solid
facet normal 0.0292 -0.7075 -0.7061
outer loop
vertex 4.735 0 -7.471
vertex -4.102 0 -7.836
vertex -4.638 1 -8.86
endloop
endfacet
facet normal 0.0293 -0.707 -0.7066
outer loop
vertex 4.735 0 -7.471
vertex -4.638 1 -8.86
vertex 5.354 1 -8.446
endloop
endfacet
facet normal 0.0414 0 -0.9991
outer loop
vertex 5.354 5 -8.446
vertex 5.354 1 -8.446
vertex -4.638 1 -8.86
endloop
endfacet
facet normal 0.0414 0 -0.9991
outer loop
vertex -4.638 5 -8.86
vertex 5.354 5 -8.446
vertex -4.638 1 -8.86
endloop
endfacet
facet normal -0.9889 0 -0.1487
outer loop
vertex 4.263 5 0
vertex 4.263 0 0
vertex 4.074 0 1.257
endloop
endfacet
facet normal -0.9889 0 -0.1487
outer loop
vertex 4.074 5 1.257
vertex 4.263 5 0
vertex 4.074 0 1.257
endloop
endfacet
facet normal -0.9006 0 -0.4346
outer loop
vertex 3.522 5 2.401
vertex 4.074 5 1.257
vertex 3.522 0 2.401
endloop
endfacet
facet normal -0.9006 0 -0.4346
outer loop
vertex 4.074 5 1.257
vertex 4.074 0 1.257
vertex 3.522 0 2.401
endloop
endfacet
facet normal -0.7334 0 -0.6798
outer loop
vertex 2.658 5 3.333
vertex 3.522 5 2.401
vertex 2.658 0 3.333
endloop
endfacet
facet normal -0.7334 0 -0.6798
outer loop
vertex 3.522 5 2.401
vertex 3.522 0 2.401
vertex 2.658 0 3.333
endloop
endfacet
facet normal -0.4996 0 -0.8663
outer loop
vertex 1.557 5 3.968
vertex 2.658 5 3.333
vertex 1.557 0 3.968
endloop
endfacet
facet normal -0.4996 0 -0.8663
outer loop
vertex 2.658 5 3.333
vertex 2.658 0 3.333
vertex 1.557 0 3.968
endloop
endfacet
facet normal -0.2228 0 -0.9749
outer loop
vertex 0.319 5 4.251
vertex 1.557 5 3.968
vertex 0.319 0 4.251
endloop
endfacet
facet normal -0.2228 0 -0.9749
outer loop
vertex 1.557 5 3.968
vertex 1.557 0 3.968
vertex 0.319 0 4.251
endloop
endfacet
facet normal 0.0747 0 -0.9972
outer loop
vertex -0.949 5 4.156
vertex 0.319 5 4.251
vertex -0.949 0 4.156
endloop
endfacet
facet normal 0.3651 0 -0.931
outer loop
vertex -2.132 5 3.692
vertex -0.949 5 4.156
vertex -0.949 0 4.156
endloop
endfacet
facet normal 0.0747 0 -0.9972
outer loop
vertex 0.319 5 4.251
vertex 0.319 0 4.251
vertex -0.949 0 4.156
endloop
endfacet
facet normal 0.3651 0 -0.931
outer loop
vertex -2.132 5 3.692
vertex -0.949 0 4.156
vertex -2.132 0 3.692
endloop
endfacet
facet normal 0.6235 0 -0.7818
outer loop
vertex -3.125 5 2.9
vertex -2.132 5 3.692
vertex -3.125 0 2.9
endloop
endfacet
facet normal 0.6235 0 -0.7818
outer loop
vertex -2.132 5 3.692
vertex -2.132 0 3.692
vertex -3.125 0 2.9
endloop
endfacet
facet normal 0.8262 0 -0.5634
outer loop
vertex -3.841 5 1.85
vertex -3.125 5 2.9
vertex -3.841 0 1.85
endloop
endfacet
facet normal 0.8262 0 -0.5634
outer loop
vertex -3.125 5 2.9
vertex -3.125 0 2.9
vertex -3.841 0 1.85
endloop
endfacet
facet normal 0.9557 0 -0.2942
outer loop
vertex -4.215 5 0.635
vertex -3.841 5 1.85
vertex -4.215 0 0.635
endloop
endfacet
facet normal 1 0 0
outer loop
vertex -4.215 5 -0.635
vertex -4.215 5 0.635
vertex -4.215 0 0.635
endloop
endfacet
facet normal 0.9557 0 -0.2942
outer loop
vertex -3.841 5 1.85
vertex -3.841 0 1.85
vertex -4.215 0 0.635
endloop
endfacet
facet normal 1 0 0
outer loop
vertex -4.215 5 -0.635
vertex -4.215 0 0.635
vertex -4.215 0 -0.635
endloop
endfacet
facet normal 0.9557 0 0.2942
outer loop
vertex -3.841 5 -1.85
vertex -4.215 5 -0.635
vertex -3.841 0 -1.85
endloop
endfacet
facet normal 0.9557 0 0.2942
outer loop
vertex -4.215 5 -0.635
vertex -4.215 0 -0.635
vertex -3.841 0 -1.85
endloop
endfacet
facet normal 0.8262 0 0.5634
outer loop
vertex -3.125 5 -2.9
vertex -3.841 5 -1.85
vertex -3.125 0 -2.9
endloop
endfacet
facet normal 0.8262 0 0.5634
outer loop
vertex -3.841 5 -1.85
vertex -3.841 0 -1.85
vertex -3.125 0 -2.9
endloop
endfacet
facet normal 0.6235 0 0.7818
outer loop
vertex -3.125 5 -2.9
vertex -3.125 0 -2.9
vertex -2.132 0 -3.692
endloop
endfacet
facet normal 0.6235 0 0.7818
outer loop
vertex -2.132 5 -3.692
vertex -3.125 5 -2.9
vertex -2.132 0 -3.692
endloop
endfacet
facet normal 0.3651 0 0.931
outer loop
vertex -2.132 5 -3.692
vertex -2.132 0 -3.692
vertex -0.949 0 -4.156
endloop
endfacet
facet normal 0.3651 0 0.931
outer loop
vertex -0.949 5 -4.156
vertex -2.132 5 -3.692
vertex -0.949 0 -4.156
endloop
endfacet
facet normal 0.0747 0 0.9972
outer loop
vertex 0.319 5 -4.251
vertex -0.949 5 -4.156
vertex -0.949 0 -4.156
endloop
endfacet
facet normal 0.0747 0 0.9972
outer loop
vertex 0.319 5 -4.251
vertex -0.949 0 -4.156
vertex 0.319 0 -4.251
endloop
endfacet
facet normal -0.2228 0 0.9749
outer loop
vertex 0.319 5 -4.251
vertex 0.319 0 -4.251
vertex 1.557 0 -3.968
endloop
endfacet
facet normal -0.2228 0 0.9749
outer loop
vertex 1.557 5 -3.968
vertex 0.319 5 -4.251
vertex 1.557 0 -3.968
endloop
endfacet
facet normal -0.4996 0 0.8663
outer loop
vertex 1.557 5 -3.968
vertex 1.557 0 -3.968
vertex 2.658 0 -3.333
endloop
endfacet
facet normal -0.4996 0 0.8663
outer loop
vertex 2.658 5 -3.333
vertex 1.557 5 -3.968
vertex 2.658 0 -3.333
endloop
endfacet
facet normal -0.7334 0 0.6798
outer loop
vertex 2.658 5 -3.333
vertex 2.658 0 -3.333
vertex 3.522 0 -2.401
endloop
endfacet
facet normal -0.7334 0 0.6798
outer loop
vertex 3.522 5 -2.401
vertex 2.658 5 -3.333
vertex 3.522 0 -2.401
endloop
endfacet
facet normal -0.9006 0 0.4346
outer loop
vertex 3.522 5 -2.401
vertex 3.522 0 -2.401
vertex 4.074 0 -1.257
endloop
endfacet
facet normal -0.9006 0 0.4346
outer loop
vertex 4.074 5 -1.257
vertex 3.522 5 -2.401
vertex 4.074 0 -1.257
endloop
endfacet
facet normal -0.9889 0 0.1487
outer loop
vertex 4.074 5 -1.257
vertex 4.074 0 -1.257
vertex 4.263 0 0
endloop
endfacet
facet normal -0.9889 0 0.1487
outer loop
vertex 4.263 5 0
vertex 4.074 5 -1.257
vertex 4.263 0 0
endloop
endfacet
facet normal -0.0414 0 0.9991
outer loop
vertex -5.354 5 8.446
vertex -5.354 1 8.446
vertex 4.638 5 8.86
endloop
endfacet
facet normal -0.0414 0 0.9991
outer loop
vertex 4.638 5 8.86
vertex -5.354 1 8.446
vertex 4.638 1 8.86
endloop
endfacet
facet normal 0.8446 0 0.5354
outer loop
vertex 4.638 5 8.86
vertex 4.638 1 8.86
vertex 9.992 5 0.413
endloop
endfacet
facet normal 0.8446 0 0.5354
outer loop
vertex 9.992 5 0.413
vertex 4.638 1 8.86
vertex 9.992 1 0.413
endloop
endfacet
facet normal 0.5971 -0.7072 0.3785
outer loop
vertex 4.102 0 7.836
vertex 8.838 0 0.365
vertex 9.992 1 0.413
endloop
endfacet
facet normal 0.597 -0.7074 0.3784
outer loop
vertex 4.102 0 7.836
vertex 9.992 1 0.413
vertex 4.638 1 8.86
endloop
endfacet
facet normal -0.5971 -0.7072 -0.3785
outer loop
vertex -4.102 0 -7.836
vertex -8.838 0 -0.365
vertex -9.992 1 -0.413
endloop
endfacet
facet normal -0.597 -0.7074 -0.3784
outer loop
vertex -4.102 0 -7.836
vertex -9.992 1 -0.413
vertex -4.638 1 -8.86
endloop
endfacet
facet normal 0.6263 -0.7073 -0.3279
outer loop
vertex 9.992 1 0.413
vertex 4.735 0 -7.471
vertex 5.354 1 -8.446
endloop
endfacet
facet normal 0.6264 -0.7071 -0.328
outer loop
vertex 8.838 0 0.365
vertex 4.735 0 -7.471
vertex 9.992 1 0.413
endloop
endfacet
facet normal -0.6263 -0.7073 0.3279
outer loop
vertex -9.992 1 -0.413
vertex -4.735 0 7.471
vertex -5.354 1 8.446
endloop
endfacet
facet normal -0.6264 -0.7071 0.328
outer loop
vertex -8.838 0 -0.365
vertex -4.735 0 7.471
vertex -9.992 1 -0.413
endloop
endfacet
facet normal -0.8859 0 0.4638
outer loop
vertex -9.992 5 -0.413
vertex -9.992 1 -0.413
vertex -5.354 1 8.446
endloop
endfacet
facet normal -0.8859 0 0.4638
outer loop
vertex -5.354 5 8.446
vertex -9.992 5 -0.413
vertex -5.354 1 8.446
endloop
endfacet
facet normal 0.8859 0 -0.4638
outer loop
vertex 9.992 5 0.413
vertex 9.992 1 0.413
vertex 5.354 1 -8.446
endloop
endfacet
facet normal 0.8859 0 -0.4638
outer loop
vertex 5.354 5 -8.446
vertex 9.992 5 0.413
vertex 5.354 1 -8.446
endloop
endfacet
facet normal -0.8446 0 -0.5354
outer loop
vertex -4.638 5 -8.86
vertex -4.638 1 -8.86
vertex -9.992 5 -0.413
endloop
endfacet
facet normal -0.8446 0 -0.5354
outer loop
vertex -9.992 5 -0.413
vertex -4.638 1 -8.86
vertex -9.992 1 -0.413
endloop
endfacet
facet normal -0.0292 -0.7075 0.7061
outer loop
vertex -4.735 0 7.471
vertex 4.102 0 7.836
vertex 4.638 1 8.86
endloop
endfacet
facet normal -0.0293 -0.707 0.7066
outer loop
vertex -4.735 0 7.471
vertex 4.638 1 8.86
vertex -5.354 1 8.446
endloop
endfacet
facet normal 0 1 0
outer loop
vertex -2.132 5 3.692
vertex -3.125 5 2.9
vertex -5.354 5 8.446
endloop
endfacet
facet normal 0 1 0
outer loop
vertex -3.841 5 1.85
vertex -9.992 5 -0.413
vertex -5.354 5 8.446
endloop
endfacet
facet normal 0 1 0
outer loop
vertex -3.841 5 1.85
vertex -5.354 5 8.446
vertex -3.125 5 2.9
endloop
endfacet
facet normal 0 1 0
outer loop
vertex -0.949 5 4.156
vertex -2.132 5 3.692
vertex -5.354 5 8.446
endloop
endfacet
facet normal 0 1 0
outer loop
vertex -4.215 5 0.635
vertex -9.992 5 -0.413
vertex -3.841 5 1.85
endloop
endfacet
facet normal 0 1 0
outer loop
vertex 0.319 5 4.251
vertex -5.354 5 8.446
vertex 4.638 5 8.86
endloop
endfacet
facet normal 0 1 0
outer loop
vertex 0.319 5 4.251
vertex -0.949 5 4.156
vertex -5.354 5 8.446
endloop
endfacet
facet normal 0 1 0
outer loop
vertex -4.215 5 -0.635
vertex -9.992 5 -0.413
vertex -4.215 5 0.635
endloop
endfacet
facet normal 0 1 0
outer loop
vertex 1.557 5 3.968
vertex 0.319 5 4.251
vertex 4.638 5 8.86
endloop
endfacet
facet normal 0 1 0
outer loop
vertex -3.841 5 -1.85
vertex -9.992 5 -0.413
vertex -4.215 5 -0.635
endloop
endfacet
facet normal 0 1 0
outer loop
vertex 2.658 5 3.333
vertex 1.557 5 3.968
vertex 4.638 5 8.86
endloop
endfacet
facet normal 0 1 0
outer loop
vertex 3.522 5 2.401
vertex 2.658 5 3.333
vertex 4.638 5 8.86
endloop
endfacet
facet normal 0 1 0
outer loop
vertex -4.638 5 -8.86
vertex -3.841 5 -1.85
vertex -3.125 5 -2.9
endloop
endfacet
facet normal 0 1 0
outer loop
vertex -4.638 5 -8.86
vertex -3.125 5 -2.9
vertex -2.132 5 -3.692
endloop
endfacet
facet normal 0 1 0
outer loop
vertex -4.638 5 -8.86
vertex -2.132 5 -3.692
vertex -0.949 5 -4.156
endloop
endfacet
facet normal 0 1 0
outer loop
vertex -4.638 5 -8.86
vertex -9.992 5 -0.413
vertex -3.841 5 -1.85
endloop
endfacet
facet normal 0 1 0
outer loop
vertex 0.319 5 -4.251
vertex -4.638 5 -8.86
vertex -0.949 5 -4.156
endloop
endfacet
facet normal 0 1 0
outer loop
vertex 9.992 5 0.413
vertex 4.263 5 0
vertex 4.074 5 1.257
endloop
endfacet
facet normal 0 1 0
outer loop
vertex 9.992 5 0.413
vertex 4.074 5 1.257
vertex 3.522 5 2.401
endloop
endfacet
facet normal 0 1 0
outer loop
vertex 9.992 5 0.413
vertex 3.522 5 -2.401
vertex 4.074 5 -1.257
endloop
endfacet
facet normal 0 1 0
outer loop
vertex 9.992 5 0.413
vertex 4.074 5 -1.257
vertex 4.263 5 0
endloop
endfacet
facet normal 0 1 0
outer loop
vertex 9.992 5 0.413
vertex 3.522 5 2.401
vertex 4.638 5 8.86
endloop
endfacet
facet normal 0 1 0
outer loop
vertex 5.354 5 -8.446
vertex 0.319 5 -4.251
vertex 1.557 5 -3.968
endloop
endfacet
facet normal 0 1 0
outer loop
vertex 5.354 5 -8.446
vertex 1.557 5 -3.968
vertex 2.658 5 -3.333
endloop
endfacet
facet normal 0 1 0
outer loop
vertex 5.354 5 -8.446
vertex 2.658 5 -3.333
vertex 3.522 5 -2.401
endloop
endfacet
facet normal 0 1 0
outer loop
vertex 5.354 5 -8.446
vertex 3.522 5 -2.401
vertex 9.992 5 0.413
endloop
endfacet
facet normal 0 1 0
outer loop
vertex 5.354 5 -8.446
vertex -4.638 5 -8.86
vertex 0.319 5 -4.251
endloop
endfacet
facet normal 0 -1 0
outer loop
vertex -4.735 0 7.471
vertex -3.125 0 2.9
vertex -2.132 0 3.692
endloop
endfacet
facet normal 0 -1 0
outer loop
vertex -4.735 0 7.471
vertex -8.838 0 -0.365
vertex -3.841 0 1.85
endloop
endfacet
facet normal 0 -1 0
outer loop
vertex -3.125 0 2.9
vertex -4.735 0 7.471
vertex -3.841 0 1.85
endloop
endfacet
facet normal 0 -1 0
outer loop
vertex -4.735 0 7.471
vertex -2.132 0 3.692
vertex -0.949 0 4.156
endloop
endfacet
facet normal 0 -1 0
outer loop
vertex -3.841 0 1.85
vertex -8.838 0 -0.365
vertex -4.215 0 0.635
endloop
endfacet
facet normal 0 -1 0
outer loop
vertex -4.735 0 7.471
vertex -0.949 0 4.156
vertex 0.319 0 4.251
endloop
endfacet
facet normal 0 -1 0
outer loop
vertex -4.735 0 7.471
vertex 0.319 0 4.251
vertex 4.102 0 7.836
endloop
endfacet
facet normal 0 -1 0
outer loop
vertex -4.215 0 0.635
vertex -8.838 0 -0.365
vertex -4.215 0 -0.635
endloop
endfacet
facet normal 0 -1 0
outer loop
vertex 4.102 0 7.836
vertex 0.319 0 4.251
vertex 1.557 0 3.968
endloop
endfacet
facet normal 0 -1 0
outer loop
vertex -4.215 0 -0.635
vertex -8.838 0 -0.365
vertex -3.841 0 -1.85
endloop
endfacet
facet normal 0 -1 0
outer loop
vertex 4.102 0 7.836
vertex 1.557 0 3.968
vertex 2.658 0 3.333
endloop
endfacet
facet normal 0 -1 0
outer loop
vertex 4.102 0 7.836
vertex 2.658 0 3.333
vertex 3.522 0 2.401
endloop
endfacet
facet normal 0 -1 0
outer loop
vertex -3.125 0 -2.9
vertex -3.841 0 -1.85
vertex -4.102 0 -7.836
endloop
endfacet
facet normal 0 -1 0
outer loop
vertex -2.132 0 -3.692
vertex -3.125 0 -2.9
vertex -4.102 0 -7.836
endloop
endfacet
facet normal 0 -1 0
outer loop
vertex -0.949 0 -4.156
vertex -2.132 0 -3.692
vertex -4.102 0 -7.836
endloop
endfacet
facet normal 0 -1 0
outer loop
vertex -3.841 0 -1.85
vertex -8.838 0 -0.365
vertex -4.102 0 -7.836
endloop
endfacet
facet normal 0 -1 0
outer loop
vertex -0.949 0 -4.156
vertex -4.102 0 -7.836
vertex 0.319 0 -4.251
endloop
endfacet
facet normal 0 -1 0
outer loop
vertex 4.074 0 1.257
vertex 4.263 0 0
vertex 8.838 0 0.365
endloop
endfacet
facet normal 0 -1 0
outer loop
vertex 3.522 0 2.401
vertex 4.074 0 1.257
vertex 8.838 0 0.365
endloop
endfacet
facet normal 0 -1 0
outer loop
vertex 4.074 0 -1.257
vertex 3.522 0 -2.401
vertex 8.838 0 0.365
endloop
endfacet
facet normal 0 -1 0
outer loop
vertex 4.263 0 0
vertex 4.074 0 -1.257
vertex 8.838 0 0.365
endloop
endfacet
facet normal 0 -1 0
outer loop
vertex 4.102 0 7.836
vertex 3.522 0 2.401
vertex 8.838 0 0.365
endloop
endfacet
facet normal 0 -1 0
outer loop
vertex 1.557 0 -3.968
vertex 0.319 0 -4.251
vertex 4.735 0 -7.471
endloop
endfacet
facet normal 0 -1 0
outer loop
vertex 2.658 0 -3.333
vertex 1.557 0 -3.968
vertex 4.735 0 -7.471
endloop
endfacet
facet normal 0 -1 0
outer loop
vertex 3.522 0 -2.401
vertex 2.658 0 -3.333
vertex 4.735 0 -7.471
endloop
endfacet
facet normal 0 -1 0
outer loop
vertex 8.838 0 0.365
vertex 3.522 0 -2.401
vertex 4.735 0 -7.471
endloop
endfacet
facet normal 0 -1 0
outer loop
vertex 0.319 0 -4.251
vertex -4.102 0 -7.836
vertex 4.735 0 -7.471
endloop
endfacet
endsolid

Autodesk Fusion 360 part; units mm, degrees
sketch "Sketch1" plane through (0, 0, 0) normal (0, 1, 0) x (1, 0, 0)
  circle A0 centre (0, 0) radius 5
  line L0 (4.6379, -8.8595) -> (9.9915, -0.4132)
  line L1 (9.9915, -0.4132) -> (5.3536, 8.4463)
  line L2 (5.3536, 8.4463) -> (-4.6379, 8.8595)
  line L3 (-4.6379, 8.8595) -> (-9.9915, 0.4132)
  line L4 (-9.9915, 0.4132) -> (-5.3536, -8.4463)
  line L5 (-5.3536, -8.4463) -> (4.6379, -8.8595)
  dimension "d1" = 10
extrude "Extrude1" add sketch "Sketch1" along normal blind 5
chamfer "Chamfer1" distance 1 angle 45 6 edges at (-7.3147, 0, -4.6363) (-7.6725, 0, 4.0165) (-0.3578, 0, 8.6529) (7.3147, 0, 4.6363) (7.6725, 0, -4.0165) (0.3578, 0, -8.6529)
thread "Thread1" "ISO Metric profile 10.0 M10x1.5 6H" major diameter 10.198 minor diameter 8.526 pitch 1.5 angle 60 resizes the face on face at (4.9938, 3.3333, 0.2492)
